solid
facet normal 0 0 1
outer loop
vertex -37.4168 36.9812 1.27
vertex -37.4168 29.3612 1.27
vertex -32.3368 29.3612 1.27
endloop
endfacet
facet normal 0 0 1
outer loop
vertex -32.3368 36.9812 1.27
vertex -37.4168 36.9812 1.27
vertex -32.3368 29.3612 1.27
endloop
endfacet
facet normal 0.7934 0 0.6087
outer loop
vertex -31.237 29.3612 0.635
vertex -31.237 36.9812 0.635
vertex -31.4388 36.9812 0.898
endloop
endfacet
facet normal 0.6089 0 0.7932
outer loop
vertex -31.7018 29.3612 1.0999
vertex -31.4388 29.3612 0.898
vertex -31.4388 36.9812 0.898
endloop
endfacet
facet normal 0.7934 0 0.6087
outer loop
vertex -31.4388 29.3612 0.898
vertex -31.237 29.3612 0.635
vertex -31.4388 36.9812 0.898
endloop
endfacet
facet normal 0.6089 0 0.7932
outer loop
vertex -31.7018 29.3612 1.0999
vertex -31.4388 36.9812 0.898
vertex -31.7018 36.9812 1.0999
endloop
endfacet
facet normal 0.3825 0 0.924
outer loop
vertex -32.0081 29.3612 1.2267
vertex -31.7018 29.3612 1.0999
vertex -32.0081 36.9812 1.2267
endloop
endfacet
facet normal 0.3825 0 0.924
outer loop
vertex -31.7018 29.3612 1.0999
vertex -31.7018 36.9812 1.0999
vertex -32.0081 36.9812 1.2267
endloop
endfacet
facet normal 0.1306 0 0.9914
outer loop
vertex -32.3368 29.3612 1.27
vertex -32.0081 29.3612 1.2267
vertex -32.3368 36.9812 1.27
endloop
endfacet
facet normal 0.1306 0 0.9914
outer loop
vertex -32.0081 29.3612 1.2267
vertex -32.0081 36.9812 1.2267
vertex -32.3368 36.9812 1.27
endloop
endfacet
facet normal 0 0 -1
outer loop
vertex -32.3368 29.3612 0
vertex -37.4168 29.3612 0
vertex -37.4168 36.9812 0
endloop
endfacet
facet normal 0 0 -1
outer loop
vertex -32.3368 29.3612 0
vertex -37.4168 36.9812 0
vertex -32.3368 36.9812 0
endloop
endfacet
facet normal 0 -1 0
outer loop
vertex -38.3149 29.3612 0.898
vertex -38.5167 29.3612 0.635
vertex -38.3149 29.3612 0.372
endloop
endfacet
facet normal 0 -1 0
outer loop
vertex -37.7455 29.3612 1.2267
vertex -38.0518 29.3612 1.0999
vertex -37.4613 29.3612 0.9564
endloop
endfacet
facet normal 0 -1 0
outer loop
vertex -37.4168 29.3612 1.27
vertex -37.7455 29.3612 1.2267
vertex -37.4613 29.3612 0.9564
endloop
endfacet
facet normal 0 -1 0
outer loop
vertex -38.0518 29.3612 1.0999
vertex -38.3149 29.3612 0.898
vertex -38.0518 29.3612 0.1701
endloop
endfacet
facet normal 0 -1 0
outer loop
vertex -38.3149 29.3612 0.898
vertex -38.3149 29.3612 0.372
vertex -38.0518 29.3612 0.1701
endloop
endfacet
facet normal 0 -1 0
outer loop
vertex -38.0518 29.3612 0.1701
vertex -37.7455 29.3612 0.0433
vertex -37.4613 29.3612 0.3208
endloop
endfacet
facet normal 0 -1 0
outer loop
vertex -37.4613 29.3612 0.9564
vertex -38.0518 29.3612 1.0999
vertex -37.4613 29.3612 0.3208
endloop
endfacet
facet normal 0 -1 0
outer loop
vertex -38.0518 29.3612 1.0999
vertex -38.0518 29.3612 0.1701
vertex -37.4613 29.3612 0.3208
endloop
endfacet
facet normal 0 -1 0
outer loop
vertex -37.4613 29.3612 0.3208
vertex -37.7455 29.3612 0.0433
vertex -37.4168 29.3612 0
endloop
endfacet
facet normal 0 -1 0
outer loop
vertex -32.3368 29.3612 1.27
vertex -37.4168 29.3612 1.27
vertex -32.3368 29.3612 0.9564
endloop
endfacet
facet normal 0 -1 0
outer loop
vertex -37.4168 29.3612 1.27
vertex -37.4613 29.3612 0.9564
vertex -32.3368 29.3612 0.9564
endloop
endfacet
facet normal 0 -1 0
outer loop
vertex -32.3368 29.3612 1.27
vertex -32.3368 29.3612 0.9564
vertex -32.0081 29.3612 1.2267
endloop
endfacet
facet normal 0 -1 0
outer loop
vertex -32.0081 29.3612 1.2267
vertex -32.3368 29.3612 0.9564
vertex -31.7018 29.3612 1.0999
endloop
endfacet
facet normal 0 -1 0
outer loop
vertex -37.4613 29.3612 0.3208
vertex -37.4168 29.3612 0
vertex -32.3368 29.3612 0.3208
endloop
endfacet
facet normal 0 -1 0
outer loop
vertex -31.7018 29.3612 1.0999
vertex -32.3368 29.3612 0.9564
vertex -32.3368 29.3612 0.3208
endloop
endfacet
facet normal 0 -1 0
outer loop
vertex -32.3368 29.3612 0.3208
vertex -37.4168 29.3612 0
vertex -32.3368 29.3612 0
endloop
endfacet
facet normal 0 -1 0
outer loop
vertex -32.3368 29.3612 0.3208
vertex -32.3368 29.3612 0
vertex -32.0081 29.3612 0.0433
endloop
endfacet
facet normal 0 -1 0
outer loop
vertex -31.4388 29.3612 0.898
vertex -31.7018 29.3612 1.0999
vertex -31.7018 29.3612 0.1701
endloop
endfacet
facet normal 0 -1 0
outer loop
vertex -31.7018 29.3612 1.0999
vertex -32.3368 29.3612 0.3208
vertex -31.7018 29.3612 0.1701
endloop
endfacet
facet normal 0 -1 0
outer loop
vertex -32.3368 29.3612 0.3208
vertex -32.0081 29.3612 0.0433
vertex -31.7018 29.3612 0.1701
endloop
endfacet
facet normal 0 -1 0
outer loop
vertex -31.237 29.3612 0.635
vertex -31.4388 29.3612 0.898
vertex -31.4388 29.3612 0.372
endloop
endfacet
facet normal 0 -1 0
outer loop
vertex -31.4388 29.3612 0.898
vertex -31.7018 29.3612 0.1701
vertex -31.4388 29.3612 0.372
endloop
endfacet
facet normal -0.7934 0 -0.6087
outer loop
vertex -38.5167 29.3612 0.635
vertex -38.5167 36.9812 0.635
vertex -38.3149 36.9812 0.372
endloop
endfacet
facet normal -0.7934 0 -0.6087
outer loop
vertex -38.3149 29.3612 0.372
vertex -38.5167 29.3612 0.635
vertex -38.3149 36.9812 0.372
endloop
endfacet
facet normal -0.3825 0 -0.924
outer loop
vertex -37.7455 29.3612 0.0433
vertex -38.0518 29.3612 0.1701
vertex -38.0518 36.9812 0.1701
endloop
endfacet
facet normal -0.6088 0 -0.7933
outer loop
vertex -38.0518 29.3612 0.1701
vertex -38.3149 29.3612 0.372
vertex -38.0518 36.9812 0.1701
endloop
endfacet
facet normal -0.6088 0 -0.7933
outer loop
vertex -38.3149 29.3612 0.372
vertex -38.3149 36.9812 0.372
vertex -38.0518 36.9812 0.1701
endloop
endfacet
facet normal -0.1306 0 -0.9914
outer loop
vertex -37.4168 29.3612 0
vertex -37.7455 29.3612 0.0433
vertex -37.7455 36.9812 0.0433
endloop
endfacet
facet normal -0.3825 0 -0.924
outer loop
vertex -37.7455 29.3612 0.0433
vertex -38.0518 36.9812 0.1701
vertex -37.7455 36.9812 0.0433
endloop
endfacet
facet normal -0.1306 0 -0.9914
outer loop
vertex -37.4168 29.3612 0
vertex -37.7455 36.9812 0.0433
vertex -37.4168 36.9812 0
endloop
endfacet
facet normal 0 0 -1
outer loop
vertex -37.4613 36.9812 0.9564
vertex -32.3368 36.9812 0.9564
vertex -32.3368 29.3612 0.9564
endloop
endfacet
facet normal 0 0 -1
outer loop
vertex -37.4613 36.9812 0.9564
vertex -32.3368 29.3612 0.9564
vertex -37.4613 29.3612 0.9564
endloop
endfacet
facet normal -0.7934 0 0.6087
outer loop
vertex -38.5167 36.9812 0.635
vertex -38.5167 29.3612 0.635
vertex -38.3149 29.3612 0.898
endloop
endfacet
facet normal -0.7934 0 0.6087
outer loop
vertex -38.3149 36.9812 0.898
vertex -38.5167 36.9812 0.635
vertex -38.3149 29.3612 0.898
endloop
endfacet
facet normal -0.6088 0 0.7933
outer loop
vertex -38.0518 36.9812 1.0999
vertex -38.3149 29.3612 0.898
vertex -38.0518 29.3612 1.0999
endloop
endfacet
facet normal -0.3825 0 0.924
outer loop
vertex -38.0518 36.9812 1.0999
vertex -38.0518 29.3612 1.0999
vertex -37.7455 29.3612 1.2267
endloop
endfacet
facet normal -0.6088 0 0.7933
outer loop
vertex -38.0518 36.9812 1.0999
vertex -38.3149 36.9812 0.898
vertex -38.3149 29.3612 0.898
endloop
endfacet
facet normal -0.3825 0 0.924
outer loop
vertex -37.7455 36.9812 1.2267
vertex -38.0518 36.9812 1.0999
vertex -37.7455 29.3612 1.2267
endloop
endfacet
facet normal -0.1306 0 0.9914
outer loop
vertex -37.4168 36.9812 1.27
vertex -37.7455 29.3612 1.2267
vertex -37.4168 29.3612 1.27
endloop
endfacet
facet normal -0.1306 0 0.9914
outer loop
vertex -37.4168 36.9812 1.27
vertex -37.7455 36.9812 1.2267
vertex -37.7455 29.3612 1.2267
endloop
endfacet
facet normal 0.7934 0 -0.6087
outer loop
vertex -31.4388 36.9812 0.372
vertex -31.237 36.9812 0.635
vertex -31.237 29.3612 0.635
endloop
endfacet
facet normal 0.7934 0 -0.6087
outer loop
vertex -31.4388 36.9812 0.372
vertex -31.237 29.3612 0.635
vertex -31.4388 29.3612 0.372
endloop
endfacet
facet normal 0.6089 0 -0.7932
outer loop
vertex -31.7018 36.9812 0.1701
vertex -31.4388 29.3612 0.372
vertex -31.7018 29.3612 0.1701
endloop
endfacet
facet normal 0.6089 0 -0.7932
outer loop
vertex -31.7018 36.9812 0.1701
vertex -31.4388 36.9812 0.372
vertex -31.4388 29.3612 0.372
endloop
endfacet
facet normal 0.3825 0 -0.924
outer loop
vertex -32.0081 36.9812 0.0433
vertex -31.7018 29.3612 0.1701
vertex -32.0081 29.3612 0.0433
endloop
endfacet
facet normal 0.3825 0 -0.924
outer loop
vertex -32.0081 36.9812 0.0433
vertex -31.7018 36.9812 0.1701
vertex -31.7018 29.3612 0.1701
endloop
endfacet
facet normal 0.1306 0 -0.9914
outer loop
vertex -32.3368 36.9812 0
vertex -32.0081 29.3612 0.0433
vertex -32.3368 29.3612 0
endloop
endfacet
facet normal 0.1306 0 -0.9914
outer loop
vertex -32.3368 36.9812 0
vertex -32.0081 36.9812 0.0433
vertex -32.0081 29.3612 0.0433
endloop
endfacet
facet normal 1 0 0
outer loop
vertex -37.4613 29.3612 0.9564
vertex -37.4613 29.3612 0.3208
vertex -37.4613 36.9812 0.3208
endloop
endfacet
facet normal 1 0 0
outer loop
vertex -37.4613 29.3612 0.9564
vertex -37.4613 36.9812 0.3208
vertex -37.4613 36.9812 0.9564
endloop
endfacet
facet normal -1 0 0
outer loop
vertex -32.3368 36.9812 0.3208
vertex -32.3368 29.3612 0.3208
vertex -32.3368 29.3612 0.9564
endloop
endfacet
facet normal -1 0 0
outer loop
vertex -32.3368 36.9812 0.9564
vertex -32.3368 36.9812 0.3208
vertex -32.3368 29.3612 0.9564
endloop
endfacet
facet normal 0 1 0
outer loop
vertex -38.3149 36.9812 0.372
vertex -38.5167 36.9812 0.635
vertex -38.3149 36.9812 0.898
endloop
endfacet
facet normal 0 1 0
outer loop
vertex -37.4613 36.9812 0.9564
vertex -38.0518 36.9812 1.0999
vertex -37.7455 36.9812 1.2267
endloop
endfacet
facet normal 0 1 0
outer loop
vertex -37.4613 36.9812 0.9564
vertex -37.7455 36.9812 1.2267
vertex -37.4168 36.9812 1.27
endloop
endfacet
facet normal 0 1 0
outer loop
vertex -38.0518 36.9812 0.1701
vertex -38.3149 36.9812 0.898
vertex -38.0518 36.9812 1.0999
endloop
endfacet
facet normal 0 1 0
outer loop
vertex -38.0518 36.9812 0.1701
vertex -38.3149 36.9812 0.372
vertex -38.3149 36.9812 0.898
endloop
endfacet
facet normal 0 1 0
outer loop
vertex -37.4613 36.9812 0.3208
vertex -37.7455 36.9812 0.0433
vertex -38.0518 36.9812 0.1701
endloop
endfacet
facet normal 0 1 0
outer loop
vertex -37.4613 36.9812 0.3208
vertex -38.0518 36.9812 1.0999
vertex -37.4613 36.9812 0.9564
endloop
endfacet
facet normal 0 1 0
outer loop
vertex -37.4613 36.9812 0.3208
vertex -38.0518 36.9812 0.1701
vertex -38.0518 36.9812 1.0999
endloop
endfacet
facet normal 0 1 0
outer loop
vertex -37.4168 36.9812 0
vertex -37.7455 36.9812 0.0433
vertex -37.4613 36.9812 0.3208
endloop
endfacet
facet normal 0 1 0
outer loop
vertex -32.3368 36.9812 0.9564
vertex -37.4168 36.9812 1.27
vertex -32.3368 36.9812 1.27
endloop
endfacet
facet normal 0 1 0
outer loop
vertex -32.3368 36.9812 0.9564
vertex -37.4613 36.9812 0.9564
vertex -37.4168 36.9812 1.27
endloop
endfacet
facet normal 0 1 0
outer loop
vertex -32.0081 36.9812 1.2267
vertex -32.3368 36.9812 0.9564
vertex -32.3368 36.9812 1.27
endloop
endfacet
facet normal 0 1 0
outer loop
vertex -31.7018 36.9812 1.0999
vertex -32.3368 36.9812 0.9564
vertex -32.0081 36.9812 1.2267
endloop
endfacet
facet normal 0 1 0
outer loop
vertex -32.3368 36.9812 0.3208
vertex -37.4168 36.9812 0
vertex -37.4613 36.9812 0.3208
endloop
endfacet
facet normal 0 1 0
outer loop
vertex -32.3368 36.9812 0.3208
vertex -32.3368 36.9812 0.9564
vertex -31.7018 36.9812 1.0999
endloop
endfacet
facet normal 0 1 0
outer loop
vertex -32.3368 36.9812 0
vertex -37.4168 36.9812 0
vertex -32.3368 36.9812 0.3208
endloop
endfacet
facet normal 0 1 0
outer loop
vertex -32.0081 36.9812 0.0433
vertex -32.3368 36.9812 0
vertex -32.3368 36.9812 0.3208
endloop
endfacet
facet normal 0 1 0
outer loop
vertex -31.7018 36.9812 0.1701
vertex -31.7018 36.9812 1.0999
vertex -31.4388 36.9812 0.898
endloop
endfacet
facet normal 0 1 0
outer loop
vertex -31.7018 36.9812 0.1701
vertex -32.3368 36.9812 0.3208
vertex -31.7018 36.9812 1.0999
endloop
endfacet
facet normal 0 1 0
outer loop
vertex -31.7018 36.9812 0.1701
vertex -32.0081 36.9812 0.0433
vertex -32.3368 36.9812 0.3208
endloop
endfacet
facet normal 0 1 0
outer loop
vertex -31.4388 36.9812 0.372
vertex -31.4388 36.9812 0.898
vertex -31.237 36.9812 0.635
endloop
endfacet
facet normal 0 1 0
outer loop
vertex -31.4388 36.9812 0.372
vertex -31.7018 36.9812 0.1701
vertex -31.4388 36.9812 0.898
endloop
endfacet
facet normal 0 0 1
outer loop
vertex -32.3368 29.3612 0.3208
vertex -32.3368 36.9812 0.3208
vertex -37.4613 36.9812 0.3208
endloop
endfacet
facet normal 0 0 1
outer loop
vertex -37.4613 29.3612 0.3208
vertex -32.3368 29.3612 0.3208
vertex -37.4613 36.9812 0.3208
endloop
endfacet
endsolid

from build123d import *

# Parameters (mm, degrees)
F0_W        = 7.62
F0_H        = 7.62
F1_DEPTH    = 1.27
F2_T1_DEPTH = 13.97
F3_W        = 5.1244873625
F3_H        = 0.6355810037
F4_DEPTH    = 7.62


# Not quite as in the source:
# - a fillet or chamfer that OpenCascade refuses, or shapes differently, is made with other operations: its cross-section is extruded or revolved along the edge and cut away or added


with BuildPart() as f1:
    # F0 (on Top) → F1 (new body)
    with BuildSketch(Plane.XY):
        with Locations((-34.8768493396, 33.171152453)):
            Rectangle(F0_W, F0_H)
    extrude(amount=F1_DEPTH)

    # F2: fillet of radius 1.27 on 4 edges, made by hand

    # F2_s2 → F2_t1 (cut)
    with BuildSketch(Plane.XZ.offset(-40.156152453)):
        with BuildLine():
            ThreePointArc((-38.6868493396, 0), (-38.3148749517, 0.8980256121), (-37.4168493396, 1.27))
            Line((-37.4168493396, 1.27), (-38.6868493396, 1.27))
            Line((-38.6868493396, 1.27), (-38.6868493396, 0))
        make_face()
        with BuildLine():
            ThreePointArc((-31.0668493396, 0), (-31.4388237275, 0.8980256121), (-32.3368493396, 1.27))
            Line((-32.3368493396, 1.27), (-31.0668493396, 1.27))
            Line((-31.0668493396, 1.27), (-31.0668493396, 0))
        make_face()
        with BuildLine():
            ThreePointArc((-38.6868493396, 1.27), (-38.3148749517, 0.3719743879), (-37.4168493396, 0))
            Line((-37.4168493396, 0), (-38.6868493396, 0))
            Line((-38.6868493396, 0), (-38.6868493396, 1.27))
        make_face()
        with BuildLine():
            ThreePointArc((-31.0668493396, 1.27), (-31.4388237275, 0.3719743879), (-32.3368493396, 0))
            Line((-32.3368493396, 0), (-31.0668493396, 0))
            Line((-31.0668493396, 0), (-31.0668493396, 1.27))
        make_face()
    extrude(amount=F2_T1_DEPTH, mode=Mode.SUBTRACT)

    # F3 (on face) → F4 (cut)
    with BuildSketch(Plane(origin=(0, 36.981152453, 0), x_dir=(-1, 0, 0), z_dir=(0, 1, 0))):
        with Locations((34.8990930209, 0.6385907036)):
            Rectangle(F3_W, F3_H)
    extrude(amount=-F4_DEPTH, mode=Mode.SUBTRACT)


solid = f1.part
